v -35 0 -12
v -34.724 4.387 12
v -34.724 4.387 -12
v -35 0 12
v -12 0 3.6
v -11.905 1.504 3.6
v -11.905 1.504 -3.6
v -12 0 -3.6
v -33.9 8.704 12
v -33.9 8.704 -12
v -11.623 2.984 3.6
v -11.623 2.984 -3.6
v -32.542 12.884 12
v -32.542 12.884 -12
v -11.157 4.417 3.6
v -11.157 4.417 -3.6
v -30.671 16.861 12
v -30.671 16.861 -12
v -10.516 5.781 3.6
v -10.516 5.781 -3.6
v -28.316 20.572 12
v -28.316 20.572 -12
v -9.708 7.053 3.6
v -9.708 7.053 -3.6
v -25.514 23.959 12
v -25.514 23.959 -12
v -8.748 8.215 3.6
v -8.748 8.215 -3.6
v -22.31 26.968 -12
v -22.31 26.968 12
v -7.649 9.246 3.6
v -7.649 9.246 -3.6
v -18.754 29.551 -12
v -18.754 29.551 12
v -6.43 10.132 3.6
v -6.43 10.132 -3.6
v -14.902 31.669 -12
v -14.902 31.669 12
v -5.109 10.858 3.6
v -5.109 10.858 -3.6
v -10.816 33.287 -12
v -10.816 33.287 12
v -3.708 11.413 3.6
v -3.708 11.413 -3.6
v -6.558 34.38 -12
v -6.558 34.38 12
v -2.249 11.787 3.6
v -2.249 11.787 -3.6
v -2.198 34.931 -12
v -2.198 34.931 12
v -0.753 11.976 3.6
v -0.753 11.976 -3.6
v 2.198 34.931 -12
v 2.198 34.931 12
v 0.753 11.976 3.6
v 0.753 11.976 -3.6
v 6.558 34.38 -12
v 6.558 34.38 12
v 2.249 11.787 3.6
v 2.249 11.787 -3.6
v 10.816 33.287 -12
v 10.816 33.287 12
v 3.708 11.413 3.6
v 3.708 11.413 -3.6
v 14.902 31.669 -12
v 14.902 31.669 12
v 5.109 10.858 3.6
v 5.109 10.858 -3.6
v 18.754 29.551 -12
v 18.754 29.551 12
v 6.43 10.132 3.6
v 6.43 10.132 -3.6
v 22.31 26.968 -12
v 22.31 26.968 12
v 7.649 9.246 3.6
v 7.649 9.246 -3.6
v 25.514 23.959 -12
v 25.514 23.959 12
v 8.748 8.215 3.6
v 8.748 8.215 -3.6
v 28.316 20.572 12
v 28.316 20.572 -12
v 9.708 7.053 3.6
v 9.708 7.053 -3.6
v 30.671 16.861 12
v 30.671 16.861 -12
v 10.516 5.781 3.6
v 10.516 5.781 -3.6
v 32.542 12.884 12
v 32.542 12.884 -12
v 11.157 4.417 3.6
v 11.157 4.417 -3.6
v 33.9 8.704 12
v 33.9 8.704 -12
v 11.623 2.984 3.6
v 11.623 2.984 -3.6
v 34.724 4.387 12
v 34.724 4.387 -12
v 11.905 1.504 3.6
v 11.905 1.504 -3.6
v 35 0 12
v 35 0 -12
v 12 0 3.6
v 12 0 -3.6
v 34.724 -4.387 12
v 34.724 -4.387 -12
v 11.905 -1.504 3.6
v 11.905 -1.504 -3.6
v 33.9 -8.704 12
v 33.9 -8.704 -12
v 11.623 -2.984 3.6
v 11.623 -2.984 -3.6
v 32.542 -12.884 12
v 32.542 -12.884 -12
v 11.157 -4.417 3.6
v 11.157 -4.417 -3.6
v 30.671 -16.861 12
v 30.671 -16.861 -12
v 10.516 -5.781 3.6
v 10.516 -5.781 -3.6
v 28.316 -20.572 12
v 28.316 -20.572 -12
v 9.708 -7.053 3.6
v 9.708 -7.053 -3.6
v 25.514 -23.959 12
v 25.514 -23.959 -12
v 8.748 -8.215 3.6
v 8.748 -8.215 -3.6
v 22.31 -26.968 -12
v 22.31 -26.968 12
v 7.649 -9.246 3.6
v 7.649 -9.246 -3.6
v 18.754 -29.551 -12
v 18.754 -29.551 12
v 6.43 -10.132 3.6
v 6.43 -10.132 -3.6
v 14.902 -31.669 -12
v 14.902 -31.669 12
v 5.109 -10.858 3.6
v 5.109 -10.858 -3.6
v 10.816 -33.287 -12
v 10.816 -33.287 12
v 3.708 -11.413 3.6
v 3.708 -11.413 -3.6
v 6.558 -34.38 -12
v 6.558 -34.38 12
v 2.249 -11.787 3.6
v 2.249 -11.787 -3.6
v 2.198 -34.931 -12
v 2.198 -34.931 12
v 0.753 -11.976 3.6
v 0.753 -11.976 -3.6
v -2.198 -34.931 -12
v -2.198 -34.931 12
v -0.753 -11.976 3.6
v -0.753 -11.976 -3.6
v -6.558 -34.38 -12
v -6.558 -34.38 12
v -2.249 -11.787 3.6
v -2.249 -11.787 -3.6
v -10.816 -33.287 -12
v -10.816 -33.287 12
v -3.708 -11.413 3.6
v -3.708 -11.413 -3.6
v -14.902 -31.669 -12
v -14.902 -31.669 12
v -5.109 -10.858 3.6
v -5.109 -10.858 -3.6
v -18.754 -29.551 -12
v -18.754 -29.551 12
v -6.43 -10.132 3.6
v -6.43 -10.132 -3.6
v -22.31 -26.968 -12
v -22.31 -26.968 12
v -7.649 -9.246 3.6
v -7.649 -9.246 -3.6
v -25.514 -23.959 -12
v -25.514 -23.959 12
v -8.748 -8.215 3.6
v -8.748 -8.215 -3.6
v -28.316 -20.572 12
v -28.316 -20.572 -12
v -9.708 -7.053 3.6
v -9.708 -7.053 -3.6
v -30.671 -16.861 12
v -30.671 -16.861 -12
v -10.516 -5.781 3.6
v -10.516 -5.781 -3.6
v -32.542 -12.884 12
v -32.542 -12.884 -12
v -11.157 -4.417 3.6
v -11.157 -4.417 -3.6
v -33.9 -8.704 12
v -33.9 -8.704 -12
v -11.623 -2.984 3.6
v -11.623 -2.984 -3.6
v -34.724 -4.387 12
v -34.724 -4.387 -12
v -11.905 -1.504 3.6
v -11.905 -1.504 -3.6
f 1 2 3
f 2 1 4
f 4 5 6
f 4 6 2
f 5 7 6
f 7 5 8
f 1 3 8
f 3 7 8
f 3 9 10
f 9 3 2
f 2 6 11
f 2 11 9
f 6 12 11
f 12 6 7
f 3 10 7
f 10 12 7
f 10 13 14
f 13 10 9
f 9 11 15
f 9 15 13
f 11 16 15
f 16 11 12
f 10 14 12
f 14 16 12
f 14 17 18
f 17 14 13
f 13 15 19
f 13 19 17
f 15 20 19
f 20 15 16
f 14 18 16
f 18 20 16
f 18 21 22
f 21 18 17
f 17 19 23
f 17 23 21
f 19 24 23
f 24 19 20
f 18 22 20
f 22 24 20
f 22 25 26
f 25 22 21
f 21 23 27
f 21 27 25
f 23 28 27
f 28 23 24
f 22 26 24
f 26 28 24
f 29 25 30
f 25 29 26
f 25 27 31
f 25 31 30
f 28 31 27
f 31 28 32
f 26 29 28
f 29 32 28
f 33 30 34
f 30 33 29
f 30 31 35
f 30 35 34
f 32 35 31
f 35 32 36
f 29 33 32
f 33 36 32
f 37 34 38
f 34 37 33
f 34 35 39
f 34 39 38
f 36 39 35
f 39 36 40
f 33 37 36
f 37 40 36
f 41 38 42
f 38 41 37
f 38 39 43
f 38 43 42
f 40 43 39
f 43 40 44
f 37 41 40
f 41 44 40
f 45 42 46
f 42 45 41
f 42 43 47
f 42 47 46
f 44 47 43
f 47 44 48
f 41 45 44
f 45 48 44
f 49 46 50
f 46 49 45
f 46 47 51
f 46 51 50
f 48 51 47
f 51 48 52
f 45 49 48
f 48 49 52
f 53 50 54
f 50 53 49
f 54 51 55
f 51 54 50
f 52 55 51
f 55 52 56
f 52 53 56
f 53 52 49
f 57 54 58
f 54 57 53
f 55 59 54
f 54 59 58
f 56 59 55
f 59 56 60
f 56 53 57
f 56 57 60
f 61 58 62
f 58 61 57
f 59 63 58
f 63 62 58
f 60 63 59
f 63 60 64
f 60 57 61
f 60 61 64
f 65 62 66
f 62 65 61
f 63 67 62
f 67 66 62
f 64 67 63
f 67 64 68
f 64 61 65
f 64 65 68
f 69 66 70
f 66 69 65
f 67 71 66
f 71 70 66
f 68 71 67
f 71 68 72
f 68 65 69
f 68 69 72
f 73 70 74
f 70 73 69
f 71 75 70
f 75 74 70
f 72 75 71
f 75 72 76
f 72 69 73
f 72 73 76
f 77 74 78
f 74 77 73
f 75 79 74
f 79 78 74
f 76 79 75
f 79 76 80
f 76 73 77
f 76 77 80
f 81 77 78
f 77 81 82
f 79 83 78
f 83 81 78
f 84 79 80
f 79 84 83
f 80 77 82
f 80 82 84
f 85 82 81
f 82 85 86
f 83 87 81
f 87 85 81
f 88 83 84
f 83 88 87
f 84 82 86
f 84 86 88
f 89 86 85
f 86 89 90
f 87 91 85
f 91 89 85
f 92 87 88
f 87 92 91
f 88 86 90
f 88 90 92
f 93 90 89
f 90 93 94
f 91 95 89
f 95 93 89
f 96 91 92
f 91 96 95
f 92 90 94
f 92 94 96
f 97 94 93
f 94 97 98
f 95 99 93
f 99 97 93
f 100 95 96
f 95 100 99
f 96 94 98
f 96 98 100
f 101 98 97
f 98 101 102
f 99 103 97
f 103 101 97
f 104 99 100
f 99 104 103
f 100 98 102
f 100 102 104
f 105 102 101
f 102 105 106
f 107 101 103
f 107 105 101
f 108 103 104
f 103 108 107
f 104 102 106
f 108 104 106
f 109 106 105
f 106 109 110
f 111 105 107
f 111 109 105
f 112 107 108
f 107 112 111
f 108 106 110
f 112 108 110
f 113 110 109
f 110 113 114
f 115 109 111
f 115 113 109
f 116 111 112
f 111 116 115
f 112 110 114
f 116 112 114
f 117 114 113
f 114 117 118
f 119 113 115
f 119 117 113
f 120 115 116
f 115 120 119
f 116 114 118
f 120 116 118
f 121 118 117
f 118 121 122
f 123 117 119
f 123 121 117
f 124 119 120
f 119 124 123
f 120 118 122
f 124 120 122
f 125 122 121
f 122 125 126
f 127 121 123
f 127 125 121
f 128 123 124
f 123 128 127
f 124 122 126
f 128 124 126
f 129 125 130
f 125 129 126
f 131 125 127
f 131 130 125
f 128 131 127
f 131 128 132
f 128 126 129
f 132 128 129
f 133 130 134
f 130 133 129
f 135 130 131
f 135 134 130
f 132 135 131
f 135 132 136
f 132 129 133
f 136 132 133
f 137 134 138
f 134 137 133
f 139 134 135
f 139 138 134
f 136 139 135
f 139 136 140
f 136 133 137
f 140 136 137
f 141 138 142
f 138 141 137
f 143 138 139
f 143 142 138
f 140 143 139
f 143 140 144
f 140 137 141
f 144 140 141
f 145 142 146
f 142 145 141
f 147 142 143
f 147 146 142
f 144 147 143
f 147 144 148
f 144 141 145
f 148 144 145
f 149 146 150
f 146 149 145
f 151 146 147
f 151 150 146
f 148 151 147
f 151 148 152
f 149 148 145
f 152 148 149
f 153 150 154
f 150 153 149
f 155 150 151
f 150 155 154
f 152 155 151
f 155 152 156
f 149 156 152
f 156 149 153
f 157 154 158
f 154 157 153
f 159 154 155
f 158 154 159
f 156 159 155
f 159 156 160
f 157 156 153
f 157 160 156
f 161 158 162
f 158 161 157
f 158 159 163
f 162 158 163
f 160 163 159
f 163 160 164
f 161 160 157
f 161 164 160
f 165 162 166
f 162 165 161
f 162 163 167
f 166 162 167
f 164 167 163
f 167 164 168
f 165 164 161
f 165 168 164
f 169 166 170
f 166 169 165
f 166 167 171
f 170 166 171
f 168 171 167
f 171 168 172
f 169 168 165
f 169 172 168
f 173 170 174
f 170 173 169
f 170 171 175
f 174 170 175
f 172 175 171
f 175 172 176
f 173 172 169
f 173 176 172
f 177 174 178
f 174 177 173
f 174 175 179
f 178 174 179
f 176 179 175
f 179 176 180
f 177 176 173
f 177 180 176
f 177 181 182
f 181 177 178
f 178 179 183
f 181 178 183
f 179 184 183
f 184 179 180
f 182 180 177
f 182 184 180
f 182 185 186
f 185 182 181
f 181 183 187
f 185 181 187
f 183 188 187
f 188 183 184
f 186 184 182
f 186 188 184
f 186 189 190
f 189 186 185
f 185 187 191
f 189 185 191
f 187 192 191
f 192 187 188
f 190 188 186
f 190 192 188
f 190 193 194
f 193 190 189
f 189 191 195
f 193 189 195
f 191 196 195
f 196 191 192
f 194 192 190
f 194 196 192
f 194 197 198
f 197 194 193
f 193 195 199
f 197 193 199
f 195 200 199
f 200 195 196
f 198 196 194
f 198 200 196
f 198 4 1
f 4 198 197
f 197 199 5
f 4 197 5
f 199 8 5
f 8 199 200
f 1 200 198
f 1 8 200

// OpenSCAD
$fn = 50;difference() {
	union() {
		rotate_extrude(angle = 360) {
			translate(v = [12, 0, 0]) {
				rotate(a = [0, 0, -90]) {
					polygon(points = [[3.6, 0], [12, 23], [-12, 23], [-3.6, 0]]);
				}
			}
		}
	}
	union();
}
